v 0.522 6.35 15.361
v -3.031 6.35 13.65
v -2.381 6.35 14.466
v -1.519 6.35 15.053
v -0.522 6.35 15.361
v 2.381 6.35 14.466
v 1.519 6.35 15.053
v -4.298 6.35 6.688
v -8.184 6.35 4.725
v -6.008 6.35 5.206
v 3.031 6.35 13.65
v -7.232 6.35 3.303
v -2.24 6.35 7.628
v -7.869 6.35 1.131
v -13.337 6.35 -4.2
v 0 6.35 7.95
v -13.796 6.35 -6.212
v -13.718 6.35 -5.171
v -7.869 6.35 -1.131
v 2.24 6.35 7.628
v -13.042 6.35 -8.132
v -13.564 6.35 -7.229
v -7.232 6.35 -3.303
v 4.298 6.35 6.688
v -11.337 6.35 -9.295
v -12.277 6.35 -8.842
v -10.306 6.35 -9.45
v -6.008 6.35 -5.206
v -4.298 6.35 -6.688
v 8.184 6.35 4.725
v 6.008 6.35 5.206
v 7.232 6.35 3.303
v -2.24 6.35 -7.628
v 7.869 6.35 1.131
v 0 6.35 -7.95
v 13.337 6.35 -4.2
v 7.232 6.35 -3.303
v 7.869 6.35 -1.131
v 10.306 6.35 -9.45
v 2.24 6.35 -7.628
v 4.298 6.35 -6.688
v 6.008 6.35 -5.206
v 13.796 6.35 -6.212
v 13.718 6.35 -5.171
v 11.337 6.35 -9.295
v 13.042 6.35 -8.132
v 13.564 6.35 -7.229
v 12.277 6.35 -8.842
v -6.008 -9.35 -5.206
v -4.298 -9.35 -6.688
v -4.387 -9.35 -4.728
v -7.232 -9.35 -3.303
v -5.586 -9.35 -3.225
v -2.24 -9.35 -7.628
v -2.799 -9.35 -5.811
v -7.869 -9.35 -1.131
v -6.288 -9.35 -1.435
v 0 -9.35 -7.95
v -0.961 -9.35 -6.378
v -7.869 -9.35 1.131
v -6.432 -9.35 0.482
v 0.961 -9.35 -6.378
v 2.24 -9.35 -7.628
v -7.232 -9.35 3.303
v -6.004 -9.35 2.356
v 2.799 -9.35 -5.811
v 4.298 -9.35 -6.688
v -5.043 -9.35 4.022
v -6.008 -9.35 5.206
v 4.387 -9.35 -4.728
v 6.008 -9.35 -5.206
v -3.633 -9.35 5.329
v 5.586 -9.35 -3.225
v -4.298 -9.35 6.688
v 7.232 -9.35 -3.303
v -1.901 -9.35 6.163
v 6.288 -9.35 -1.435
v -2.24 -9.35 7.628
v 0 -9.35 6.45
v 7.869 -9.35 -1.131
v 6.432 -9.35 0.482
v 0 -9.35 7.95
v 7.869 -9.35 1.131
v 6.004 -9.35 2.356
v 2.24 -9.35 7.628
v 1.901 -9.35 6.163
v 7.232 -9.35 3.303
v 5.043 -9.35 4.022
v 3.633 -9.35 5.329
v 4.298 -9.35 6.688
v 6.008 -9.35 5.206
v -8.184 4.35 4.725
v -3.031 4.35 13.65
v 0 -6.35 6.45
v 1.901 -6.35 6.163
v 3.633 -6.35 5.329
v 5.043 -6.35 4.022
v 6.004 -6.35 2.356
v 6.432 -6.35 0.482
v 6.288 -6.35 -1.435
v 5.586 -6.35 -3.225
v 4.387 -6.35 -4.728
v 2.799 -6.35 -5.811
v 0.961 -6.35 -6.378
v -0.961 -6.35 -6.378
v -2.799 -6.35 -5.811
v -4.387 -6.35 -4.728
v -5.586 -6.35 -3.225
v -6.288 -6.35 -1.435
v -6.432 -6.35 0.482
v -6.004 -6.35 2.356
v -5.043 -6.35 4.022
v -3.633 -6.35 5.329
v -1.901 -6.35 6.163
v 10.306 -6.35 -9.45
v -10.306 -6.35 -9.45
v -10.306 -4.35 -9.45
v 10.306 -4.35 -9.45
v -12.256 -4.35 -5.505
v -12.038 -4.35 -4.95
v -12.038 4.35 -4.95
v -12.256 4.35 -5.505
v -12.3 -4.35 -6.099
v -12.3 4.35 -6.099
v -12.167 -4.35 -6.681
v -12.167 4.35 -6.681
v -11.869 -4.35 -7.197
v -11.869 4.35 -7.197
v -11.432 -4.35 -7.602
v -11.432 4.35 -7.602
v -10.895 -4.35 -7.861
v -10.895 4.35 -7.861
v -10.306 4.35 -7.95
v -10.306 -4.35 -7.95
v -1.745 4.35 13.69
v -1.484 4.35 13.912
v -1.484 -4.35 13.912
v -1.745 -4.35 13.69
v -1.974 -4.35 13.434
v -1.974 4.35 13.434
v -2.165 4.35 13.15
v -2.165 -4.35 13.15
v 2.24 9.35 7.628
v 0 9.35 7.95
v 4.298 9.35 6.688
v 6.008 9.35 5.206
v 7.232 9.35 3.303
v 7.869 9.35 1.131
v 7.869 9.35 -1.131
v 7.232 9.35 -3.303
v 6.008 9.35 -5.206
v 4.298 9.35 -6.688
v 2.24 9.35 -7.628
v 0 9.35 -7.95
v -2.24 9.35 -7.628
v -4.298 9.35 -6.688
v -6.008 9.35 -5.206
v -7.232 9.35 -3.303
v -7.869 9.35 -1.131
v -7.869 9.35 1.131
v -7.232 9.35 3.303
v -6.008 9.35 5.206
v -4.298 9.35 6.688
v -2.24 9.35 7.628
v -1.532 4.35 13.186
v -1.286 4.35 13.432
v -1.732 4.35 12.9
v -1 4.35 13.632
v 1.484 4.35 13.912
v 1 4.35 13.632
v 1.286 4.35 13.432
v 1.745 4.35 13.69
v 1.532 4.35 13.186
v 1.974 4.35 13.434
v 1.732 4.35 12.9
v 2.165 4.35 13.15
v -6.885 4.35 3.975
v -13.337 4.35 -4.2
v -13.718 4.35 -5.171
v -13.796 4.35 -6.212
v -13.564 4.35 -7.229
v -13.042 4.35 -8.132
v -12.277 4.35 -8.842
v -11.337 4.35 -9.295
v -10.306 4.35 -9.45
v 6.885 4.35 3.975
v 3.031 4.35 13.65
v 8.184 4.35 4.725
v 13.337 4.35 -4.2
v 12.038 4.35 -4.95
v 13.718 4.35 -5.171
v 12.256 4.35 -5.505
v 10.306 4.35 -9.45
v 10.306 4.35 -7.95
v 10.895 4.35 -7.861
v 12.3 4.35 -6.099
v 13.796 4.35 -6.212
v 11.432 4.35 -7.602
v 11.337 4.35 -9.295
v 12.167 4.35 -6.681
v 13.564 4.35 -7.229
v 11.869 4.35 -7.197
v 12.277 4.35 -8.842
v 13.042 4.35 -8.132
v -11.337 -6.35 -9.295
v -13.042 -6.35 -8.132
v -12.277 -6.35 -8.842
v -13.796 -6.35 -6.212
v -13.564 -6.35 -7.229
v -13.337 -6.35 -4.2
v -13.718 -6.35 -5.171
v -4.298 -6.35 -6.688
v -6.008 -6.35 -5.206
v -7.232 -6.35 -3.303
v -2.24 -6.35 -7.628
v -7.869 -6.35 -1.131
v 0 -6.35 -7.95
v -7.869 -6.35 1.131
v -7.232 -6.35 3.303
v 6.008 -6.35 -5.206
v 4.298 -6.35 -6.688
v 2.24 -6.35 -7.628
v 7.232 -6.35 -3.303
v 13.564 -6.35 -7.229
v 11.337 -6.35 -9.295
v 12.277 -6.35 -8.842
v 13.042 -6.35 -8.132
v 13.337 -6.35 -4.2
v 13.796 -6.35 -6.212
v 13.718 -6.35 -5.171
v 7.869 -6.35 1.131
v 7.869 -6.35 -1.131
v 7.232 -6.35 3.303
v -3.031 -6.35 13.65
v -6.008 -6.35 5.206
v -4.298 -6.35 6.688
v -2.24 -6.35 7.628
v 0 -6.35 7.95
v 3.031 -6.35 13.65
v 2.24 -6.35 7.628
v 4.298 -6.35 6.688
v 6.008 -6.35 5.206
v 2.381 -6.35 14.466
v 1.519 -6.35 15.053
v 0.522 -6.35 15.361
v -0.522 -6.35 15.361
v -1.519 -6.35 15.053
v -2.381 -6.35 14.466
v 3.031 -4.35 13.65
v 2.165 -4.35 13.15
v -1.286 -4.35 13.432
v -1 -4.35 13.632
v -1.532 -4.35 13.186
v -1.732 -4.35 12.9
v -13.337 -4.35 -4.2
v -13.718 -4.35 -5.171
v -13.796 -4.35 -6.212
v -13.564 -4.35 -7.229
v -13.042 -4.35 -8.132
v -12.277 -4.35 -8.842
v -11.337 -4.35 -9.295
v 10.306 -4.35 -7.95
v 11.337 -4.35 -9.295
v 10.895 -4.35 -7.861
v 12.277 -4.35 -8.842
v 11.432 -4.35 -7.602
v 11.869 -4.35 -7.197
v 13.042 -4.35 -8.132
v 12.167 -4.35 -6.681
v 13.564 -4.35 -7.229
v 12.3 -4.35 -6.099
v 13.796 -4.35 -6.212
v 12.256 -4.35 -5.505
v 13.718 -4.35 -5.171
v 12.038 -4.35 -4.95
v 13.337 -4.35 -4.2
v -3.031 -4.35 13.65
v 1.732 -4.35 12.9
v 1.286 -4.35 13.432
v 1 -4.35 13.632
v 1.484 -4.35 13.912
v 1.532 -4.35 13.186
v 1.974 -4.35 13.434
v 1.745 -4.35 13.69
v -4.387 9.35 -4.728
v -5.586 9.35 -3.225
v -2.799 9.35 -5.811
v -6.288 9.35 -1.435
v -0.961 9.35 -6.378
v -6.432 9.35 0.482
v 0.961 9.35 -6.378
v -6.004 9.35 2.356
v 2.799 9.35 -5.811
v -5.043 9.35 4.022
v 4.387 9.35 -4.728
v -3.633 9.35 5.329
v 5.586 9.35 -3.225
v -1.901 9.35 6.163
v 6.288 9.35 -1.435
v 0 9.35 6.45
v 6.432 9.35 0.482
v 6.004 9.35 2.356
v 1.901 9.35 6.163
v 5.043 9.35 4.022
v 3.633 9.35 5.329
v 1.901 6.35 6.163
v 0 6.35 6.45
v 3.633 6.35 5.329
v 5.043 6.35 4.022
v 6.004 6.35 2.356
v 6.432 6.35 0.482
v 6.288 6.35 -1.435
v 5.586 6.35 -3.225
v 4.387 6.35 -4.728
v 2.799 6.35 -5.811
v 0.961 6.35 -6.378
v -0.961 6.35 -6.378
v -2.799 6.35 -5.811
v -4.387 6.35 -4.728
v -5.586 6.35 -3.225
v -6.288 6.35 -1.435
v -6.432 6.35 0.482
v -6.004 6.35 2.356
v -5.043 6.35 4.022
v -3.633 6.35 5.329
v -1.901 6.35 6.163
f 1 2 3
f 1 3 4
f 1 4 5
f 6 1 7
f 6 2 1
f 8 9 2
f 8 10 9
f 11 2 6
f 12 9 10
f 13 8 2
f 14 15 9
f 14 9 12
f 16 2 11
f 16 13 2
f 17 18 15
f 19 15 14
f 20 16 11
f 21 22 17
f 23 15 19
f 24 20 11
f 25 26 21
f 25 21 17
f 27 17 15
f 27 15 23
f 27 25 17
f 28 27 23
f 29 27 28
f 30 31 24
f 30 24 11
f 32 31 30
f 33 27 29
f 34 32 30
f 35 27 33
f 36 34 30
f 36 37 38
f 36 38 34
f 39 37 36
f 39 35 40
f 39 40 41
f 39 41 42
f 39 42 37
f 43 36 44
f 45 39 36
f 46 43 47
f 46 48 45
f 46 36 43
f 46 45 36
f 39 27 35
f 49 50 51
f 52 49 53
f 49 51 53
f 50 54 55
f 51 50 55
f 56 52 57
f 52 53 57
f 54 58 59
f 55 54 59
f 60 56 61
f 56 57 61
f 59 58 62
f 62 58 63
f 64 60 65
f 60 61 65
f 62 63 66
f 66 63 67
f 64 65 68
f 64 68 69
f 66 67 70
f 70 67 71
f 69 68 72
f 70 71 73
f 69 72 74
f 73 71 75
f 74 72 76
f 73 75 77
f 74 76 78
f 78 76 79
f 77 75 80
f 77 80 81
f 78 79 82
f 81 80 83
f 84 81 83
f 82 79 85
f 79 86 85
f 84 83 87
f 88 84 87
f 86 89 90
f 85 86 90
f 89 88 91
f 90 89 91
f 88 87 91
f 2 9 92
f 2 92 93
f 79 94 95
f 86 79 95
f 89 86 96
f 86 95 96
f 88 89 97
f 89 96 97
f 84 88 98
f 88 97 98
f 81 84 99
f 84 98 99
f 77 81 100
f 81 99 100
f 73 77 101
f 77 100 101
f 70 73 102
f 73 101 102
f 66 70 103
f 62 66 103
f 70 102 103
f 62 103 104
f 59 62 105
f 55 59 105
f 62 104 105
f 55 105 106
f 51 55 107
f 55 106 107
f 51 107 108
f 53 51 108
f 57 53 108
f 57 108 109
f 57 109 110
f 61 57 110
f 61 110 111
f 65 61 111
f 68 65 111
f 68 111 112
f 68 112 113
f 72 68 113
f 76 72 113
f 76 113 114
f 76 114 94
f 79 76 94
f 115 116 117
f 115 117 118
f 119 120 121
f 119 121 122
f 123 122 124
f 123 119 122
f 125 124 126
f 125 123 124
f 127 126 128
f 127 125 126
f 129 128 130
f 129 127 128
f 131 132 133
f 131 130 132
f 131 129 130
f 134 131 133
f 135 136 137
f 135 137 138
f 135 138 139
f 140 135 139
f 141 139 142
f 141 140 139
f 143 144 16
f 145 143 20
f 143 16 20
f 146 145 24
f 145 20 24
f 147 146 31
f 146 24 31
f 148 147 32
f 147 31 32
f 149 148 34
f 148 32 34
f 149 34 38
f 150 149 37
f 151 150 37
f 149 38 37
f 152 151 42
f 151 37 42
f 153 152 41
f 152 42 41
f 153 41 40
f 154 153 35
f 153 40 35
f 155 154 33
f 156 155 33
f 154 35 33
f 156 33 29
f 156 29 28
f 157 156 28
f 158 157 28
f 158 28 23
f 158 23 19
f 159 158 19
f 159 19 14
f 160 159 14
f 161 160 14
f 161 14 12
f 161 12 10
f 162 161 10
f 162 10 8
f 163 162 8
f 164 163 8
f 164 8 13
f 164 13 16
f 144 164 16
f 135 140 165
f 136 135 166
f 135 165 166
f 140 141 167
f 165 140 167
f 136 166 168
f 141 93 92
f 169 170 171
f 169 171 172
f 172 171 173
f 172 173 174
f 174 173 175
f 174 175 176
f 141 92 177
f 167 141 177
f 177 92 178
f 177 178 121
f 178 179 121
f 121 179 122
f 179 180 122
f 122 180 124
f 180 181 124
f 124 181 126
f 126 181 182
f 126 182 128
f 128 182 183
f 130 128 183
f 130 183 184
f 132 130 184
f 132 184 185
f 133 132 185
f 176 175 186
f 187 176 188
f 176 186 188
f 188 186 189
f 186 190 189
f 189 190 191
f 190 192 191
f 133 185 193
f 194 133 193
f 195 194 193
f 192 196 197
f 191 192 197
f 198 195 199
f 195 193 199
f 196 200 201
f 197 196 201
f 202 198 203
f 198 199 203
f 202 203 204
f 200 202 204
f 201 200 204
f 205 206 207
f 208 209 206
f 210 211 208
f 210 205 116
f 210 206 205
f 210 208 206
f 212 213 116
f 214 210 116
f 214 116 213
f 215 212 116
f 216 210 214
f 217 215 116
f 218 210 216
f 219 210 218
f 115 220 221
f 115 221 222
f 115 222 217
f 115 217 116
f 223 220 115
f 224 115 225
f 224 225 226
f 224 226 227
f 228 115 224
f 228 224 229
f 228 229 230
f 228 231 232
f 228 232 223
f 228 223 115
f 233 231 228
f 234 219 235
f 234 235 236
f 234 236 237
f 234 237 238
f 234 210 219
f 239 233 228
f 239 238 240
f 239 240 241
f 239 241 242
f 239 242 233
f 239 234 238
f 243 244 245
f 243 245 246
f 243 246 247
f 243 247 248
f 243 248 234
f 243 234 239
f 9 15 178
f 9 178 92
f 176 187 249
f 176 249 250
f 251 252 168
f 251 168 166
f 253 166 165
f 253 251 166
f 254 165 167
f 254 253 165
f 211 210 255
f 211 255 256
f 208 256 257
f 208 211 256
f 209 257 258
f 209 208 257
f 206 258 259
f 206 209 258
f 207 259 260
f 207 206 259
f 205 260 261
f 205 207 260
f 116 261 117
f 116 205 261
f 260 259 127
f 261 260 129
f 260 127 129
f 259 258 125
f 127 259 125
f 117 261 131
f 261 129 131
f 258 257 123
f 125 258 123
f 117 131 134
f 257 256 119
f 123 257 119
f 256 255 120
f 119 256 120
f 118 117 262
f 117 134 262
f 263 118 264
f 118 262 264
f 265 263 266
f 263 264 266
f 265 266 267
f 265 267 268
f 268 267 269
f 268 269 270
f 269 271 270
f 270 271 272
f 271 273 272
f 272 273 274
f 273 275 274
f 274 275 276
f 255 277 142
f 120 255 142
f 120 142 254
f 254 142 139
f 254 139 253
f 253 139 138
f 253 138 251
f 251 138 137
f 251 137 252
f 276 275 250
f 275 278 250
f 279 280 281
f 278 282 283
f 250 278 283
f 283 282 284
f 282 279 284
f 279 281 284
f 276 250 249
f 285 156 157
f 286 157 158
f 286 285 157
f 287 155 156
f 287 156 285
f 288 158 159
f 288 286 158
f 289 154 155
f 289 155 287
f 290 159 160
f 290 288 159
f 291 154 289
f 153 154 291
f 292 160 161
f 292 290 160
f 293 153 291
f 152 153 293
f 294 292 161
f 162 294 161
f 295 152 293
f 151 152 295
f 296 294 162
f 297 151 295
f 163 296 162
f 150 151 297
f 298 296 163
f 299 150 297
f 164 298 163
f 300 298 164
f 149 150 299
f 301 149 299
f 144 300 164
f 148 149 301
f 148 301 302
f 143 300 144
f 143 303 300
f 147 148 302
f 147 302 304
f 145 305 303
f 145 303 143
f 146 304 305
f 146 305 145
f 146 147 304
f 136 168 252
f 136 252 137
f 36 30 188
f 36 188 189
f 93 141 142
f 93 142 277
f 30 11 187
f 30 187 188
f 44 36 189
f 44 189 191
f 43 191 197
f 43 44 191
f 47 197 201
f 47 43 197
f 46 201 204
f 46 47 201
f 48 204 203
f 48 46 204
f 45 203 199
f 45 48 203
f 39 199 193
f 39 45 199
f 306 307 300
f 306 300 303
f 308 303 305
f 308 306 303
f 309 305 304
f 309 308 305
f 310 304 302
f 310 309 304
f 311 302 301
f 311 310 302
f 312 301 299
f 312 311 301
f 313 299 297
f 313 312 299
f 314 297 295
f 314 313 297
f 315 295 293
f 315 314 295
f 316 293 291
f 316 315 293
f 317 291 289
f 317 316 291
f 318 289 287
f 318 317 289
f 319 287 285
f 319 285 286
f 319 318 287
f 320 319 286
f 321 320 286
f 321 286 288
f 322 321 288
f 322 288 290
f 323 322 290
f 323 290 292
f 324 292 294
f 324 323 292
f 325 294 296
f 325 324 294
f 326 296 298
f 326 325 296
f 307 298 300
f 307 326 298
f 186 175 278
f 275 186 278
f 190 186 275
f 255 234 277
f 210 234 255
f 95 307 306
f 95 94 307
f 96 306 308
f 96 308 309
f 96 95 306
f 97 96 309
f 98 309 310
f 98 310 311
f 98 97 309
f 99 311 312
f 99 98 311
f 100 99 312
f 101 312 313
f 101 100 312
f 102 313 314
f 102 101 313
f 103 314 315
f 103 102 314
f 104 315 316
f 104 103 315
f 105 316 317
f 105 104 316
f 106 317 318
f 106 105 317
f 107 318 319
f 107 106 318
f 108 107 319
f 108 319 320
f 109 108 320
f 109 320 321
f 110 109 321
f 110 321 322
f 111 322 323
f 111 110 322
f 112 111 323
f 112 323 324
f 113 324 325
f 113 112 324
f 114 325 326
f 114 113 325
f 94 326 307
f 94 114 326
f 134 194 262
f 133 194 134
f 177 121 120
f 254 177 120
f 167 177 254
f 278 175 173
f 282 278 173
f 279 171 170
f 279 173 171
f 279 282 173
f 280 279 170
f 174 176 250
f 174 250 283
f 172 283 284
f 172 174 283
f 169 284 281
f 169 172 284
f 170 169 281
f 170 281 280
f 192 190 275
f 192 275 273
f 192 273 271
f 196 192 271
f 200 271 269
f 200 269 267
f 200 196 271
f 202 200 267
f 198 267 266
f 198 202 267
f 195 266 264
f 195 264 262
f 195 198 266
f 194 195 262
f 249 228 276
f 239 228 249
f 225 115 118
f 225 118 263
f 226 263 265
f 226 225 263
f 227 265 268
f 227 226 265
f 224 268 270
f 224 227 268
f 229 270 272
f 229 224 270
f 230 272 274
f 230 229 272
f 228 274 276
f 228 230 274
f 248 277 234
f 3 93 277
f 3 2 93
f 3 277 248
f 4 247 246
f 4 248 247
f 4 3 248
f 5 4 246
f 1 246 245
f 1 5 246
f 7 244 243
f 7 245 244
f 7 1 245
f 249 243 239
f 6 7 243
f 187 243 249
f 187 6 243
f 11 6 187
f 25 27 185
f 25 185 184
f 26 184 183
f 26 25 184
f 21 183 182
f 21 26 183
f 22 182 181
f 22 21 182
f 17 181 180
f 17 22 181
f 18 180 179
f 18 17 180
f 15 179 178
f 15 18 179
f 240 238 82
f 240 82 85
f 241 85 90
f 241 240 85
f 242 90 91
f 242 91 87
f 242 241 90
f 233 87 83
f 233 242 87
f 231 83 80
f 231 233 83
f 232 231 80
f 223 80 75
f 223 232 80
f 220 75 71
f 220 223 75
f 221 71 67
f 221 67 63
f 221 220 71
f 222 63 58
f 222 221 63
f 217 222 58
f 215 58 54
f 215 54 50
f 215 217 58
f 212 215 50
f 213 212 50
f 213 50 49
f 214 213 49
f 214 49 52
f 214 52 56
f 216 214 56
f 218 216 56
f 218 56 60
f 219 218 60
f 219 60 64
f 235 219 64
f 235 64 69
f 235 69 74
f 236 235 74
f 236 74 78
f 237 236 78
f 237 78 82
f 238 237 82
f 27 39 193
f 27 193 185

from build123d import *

# Parameters (mm, degrees)
SKETCH1_R                = 6.45
BOSS_EXTRUDE1_DEPTH      = 6.35
FILLET1_R                = 2
SKETCH3_R                = 7.95
SKETCH3_R_2              = 6.45
BOSS_EXTRUDE3_DEPTH      = 3
BOSS_EXTRUDE3_DEPTH_BACK = 15.7
BOSS_EXTRUDE4_DEPTH      = 2
BOSS_EXTRUDE5_DEPTH      = 2
BOSS_EXTRUDE6_DEPTH      = 8.7


with BuildPart() as part:
    # Sketch1 → Boss-Extrude1 (new body, symmetric)
    with BuildSketch(Plane(origin=(0, 0, 0), x_dir=(1, 0, 0), z_dir=(0, 1, 0))):
        Polygon((0, -15.9), (13.76980392, 7.95), (-13.76980392, 7.95), align=None)
        with Locations(Location((0, 0, 0), (0, 0, 270))):  # turned: the seam where the file's is
            Circle(SKETCH1_R, mode=Mode.SUBTRACT)
    extrude(amount=BOSS_EXTRUDE1_DEPTH, both=True)

    # Fillet1
    fillet1_edges = [part.edges().sort_by_distance(p)[0] for p in [
        (-13.76980392, 0, -7.95),
        (13.76980392, 0, -7.95),
        (0, 0, 15.9),
    ]]
    fillet(fillet1_edges, radius=FILLET1_R)

    # Sketch3 → Boss-Extrude3 (add, two sides)
    with BuildSketch(Plane(origin=(0, 6.35, 0), x_dir=(1, 0, 0), z_dir=(0, 1, 0))) as boss_extrude3_sk:
        with Locations(Location((0, 0, 0), (0, 0, 270))):  # turned: the seam where the file's is
            Circle(SKETCH3_R)
        with Locations(Location((0, 0, 0), (0, 0, 270))):  # turned: the seam where the file's is
            Circle(SKETCH3_R_2, mode=Mode.SUBTRACT)
    extrude(amount=BOSS_EXTRUDE3_DEPTH)
    extrude(boss_extrude3_sk.sketch, amount=-BOSS_EXTRUDE3_DEPTH_BACK)

    # Sketch4 → Boss-Extrude4 (add)
    with BuildSketch(Plane(origin=(0, 6.35, 0), x_dir=(1, 0, 0), z_dir=(0, 1, 0))):
        with BuildLine():
            Line((8.183940066, -4.725), (13.336791218, 4.2))
            ThreePointArc((13.336791218, 4.2), (13.336791218, 7.7), (10.305702305, 9.45))
            Line((10.305702305, 9.45), (0, 9.45))
            Line((0, 9.45), (-10.305702305, 9.45))
            ThreePointArc((-10.305702305, 9.45), (-13.336791218, 7.7), (-13.336791218, 4.2))
            Line((-13.336791218, 4.2), (-8.183940066, -4.725))
            Line((-8.183940066, -4.725), (-3.031088913, -13.65))
            ThreePointArc((-3.031088913, -13.65), (0, -15.4), (3.031088913, -13.65))
            Line((3.031088913, -13.65), (8.183940066, -4.725))
        make_face()
        with BuildLine():
            Line((6.88490196, -3.975), (12.037753113, 4.95))
            ThreePointArc((12.037753113, 4.95), (12.037753113, 6.95), (10.305702305, 7.95))
            Line((10.305702305, 7.95), (0, 7.95))
            Line((0, 7.95), (-10.305702305, 7.95))
            ThreePointArc((-10.305702305, 7.95), (-12.037753113, 6.95), (-12.037753113, 4.95))
            Line((-12.037753113, 4.95), (-6.88490196, -3.975))
            Line((-6.88490196, -3.975), (-1.732050808, -12.9))
            ThreePointArc((-1.732050808, -12.9), (0, -13.9), (1.732050808, -12.9))
            Line((1.732050808, -12.9), (6.88490196, -3.975))
        make_face(mode=Mode.SUBTRACT)
    extrude(amount=-BOSS_EXTRUDE4_DEPTH)

    # Sketch5 → Boss-Extrude5 (add)
    with BuildSketch(Plane.XZ.offset(6.35)):
        with BuildLine():
            Line((13.336791218, -4.2), (3.031088913, 13.65))
            ThreePointArc((3.031088913, 13.65), (0, 15.4), (-3.031088913, 13.65))
            Line((-3.031088913, 13.65), (-13.336791218, -4.2))
            ThreePointArc((-13.336791218, -4.2), (-13.336791218, -7.7), (-10.305702305, -9.45))
            Line((-10.305702305, -9.45), (10.305702305, -9.45))
            ThreePointArc((10.305702305, -9.45), (13.336791218, -7.7), (13.336791218, -4.2))
        make_face()
        with BuildLine():
            Line((10.305702305, -7.95), (-10.305702305, -7.95))
            ThreePointArc((-10.305702305, -7.95), (-12.037753113, -6.95), (-12.037753113, -4.95))
            Line((-12.037753113, -4.95), (-1.732050808, 12.9))
            ThreePointArc((-1.732050808, 12.9), (0, 13.9), (1.732050808, 12.9))
            Line((1.732050808, 12.9), (12.037753113, -4.95))
            ThreePointArc((12.037753113, -4.95), (12.037753113, -6.95), (10.305702305, -7.95))
        make_face(mode=Mode.SUBTRACT)
    extrude(amount=-BOSS_EXTRUDE5_DEPTH)

    # Sketch6 → Boss-Extrude6 (add)
    with BuildSketch(Plane.XZ.offset(-4.35)):
        with BuildLine():
            Line((-2.165063509, 13.15), (-3.031088913, 13.65))
            ThreePointArc((-3.031088913, 13.65), (0, 15.4), (3.031088913, 13.65))
            Line((3.031088913, 13.65), (2.165063509, 13.15))
            ThreePointArc((2.165063509, 13.15), (1.864007283, 13.565976245), (1.484313483, 13.911669328))
            Line((1.484313483, 13.911669328), (1, 13.632050808))
            ThreePointArc((1, 13.632050808), (0, 13.9), (-1, 13.632050808))
            Line((-1, 13.632050808), (-1.484313483, 13.911669328))
            ThreePointArc((-1.484313483, 13.911669328), (-1.864007283, 13.565976245), (-2.165063509, 13.15))
        make_face()
    extrude(amount=BOSS_EXTRUDE6_DEPTH)


solid = part.part
